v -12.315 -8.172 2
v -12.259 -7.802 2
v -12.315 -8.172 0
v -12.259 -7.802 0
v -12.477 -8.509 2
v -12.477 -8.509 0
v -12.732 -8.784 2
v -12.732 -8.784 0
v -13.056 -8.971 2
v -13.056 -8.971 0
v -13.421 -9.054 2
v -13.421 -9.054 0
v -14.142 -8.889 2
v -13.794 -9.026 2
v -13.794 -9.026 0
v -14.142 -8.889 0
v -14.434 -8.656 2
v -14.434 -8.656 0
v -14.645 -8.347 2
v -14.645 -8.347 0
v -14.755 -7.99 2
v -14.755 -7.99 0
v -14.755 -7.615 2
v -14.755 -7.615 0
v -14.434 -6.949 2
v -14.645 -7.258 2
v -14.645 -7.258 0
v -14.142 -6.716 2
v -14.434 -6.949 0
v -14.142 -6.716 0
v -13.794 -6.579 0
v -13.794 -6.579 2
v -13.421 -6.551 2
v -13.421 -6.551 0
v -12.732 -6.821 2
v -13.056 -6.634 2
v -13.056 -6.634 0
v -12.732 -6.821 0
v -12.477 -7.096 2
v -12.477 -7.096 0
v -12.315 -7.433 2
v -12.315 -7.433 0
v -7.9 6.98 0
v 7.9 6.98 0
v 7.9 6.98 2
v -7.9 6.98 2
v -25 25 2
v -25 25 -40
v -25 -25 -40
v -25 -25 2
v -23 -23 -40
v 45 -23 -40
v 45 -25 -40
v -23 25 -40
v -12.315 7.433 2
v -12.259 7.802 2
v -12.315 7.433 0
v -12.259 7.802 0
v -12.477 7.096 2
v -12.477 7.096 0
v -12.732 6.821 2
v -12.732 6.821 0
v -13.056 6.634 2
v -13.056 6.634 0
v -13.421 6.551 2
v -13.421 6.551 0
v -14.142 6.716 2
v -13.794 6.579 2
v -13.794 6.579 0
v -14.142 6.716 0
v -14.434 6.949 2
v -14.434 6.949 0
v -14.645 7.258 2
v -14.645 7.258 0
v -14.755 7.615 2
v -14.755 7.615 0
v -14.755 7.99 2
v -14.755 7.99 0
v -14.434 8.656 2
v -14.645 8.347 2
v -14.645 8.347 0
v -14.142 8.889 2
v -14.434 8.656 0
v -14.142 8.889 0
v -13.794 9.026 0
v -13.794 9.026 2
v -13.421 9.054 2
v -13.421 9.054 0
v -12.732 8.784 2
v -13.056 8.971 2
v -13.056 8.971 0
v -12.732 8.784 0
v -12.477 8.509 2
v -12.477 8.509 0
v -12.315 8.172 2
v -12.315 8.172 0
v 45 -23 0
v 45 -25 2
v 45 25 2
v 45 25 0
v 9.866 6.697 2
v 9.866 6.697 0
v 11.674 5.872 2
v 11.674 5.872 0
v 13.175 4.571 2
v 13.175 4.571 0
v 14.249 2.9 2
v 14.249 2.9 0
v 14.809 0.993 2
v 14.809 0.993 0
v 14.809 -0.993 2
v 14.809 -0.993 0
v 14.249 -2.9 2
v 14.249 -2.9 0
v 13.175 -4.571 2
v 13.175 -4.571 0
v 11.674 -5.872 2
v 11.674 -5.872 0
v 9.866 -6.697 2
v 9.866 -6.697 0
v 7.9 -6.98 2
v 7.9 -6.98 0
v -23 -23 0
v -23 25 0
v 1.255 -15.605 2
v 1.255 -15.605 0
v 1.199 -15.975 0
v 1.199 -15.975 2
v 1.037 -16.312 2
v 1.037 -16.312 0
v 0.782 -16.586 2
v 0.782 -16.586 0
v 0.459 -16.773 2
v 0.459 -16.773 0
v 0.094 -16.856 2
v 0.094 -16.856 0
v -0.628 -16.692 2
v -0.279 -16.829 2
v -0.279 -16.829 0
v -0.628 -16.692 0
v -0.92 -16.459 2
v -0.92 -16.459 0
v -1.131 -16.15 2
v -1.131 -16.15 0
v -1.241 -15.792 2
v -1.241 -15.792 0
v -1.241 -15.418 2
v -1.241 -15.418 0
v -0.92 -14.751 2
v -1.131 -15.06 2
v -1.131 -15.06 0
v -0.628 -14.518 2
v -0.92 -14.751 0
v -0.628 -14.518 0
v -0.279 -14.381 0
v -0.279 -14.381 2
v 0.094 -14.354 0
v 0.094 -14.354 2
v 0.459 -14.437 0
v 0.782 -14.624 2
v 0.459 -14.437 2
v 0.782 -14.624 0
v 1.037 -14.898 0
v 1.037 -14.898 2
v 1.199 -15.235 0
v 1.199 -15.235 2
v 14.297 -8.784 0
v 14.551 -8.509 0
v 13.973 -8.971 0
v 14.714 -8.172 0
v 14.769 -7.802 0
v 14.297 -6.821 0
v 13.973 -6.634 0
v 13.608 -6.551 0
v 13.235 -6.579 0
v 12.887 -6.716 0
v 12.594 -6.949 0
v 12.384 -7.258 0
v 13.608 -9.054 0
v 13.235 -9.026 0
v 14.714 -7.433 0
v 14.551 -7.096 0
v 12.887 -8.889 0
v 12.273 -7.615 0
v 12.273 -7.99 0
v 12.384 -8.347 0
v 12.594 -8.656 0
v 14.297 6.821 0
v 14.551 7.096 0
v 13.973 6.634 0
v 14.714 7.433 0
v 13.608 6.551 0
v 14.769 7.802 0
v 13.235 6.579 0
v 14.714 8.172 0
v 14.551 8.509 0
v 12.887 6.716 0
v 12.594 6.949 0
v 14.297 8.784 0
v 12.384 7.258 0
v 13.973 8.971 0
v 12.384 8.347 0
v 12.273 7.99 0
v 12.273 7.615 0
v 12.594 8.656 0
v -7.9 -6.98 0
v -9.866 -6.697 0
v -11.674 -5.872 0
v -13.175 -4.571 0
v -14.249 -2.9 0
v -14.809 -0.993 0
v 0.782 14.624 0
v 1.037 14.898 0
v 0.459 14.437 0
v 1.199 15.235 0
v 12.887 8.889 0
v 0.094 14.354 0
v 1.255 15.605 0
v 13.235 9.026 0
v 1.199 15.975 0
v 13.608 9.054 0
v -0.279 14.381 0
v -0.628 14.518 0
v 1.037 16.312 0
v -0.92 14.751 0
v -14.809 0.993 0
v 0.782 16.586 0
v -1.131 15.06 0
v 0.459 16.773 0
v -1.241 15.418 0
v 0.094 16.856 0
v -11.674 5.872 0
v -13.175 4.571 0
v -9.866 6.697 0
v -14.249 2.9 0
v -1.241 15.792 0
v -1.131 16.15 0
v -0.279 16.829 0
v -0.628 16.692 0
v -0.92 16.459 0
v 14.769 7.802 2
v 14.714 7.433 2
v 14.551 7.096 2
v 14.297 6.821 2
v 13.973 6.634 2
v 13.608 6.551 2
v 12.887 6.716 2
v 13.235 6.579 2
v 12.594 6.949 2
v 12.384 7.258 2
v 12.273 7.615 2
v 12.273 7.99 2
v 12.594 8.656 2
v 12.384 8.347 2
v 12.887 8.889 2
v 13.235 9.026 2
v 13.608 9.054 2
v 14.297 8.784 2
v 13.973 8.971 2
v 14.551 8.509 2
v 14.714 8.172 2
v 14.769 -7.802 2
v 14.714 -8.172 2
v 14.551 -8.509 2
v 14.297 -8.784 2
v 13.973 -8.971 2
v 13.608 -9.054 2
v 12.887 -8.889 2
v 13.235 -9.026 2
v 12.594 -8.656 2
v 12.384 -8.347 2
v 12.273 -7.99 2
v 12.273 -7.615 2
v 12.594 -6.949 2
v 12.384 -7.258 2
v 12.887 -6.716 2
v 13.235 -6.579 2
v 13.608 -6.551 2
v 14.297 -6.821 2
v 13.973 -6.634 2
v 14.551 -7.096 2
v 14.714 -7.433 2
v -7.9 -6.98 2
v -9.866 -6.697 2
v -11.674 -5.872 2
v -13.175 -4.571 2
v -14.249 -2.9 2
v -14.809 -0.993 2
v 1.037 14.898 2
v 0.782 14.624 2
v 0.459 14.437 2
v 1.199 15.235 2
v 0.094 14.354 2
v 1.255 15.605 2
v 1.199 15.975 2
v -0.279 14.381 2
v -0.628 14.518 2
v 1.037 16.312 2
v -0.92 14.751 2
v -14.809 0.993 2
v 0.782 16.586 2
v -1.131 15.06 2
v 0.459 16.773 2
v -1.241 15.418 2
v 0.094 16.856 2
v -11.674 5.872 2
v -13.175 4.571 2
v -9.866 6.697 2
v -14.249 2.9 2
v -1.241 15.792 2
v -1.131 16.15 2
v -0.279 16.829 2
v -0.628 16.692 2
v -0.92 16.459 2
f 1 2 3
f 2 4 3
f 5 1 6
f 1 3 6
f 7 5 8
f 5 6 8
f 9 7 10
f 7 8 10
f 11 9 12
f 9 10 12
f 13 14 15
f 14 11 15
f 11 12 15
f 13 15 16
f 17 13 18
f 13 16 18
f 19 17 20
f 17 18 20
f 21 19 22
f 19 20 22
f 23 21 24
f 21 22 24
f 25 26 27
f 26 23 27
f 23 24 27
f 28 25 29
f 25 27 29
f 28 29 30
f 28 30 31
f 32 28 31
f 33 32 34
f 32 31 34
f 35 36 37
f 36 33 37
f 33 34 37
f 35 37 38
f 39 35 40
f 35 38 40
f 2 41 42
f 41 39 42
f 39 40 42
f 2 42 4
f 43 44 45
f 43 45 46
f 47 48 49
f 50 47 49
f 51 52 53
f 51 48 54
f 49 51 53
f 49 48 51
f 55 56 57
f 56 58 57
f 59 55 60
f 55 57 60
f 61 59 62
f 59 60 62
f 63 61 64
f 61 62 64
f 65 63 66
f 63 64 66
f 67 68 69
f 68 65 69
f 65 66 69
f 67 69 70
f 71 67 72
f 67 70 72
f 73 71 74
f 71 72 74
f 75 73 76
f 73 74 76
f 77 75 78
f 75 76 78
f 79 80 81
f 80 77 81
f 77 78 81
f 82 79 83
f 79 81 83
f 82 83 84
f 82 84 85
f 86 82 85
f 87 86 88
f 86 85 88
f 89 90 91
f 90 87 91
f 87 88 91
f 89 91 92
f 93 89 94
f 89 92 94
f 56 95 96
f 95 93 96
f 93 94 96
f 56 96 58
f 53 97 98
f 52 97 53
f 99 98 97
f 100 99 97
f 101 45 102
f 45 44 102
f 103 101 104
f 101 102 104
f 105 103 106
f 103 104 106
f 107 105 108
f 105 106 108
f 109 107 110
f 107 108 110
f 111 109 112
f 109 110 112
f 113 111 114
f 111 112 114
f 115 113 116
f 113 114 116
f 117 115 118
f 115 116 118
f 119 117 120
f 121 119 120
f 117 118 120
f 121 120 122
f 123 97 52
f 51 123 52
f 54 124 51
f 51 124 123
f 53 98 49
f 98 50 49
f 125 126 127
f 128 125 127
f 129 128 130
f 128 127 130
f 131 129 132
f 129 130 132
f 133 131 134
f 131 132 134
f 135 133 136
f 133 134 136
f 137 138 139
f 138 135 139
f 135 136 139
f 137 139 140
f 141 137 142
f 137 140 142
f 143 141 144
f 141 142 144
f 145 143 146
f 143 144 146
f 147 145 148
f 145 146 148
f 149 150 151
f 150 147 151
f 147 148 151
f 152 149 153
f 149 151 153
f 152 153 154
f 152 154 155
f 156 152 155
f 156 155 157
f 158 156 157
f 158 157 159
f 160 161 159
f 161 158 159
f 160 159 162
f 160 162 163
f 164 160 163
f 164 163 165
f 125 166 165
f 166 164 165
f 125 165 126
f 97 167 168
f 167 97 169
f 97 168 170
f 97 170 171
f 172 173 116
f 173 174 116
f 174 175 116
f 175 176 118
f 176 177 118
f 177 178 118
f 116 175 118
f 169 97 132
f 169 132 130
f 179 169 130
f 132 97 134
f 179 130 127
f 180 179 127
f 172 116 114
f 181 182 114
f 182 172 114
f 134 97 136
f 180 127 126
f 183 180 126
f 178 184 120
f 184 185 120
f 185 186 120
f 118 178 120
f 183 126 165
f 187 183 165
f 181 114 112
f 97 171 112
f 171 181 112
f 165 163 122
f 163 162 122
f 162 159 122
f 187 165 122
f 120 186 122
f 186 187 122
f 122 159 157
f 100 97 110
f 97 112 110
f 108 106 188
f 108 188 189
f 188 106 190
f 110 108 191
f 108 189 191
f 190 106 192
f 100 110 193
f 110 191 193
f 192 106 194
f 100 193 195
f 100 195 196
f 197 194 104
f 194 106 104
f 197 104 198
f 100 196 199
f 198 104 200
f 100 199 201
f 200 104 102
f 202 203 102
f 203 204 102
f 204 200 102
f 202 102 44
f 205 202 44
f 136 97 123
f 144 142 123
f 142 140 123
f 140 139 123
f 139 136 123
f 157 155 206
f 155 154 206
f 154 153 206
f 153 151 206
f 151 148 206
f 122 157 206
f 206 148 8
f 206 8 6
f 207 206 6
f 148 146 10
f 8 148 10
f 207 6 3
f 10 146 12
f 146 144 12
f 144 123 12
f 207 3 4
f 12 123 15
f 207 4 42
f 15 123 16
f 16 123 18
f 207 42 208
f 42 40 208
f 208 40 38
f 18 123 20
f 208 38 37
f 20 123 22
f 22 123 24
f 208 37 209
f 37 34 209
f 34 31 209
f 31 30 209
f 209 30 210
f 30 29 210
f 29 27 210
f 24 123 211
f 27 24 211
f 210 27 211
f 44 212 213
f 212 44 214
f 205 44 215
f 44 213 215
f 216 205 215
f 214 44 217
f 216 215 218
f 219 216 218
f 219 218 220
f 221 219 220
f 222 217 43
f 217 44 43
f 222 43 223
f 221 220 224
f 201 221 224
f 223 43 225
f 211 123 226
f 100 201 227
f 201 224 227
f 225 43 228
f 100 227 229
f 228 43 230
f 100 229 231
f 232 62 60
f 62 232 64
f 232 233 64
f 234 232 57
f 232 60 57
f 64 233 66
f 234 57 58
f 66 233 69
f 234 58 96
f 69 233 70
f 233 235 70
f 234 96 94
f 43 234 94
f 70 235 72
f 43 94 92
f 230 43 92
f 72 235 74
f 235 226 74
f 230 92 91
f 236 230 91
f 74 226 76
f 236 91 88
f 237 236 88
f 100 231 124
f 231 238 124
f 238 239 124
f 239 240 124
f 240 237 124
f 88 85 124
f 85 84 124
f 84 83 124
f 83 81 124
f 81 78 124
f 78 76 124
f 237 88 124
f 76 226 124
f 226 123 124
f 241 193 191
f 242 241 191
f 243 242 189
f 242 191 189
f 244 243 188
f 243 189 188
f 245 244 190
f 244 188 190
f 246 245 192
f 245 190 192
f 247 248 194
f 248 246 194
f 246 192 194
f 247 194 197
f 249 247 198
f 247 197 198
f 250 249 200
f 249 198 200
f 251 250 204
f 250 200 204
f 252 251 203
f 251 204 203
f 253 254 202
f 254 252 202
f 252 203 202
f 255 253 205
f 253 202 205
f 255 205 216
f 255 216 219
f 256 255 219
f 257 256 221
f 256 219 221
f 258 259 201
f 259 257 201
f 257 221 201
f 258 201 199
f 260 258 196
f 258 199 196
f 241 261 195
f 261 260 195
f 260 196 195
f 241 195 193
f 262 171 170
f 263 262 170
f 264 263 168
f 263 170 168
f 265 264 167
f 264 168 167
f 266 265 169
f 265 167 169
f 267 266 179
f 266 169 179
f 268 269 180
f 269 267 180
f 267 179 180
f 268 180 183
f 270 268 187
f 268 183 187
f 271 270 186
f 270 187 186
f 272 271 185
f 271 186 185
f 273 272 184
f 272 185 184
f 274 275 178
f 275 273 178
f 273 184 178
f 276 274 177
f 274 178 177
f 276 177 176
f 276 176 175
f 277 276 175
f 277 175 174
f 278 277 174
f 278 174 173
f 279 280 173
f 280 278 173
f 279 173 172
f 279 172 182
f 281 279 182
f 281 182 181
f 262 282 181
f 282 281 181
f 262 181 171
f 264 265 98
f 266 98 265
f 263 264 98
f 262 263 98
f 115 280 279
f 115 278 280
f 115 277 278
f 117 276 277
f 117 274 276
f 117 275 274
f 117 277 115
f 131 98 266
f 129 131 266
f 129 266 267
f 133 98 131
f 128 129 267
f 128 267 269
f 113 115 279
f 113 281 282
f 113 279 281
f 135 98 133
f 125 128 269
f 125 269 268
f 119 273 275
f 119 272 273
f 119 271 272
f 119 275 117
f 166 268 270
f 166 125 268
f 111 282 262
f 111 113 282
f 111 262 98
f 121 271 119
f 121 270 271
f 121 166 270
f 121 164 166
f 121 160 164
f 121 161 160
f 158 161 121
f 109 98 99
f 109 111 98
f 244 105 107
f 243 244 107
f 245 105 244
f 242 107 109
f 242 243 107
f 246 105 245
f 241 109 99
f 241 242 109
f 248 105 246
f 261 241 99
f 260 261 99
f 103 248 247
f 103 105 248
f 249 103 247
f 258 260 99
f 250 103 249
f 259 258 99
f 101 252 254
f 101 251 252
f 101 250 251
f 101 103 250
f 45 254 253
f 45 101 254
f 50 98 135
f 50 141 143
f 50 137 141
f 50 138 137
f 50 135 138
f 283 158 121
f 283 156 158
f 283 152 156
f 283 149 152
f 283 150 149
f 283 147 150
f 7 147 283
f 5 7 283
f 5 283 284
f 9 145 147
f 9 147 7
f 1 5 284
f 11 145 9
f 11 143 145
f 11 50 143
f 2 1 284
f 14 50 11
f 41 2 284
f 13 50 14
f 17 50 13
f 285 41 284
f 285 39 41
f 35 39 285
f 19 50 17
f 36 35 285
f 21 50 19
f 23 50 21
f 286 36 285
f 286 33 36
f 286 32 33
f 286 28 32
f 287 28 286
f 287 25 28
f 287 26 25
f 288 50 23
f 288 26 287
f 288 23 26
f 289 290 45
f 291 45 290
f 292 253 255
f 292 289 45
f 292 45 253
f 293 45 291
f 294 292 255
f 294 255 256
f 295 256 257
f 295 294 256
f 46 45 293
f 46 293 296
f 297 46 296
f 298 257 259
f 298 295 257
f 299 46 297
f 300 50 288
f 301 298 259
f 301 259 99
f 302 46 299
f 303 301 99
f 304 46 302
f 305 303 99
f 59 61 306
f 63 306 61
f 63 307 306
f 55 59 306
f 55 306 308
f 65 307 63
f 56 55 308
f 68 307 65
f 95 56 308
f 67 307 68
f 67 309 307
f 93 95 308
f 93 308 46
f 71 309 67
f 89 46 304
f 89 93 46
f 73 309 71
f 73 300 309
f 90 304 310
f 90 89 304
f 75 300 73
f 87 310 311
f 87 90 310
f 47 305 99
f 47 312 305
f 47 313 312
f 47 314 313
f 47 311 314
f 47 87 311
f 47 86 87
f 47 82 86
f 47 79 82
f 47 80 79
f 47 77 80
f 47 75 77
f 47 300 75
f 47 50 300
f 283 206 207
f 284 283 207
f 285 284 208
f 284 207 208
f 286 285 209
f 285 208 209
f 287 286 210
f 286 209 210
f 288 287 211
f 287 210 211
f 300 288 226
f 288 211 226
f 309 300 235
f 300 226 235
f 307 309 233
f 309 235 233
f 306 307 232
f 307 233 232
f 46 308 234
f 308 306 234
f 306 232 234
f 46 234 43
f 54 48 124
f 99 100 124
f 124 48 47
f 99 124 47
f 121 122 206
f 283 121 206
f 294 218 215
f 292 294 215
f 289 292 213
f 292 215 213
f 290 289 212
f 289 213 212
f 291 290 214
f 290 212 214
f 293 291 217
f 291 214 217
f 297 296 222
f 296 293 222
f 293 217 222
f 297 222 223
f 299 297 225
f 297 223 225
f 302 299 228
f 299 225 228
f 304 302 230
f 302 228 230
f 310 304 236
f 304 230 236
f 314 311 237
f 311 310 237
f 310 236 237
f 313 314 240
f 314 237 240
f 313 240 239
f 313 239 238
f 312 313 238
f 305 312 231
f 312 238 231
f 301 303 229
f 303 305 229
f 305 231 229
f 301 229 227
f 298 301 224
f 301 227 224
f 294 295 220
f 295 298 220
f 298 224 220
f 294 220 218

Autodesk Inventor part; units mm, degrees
ref_plane "YZ Plane" through (0, 0, 0) normal (1, 0, 0) x (0, 1, 0)
ref_plane "XZ Plane" through (0, 0, 0) normal (0, 1, 0) x (-1, 0, 0)
ref_plane "XY Plane" through (0, 0, 0) normal (0, 0, 1) x (1, 0, 0)
sketch "Sketch1" plane through (0, 0, 0) normal (0, 0, 1) x (1, 0, 0)
  circle A0 centre (0, 0) radius 18.38
  circle A1 centre (13.5143, 7.8025) radius 1.255
  circle A2 centre (0, 15.605) radius 1.255
  circle A3 centre (-13.5143, 7.8025) radius 1.255
  circle A4 centre (-13.5143, -7.8025) radius 1.255
  circle A5 centre (0, -15.605) radius 1.255
  circle A6 centre (13.5143, -7.8025) radius 1.255
  circle A7 centre (7.9, 0) radius 5.98
  line L0 (25, 25) -> (-25, 25)
  line L1 (-25, 25) -> (-25, -25)
  line L2 (-25, -25) -> (25, -25)
  line L3 (25, -25) -> (25, 25)
  line L4 (25, 25) -> (-25, -25) construction
  line L5 (-25, 25) -> (25, -25) construction
  circle A8 centre (7.9, 0) radius 6.98
  line L6 (7.9, -6.98) -> (-7.9, -6.98)
  line L7 (7.9, 6.98) -> (-7.9, 6.98)
  circle A9 centre (-7.9, 0) radius 6.98
  line L8 (23, 23) -> (-23, 23)
  line L9 (-23, 23) -> (-23, -23)
  line L10 (-23, -23) -> (23, -23)
  line L11 (23, -23) -> (23, 23)
  line L12 (-23, 23) -> (-23, 25)
  line L13 (23, 23) -> (23, 25)
  line L14 (23, -23) -> (23, -25)
  line L15 (23, -23) -> (25, -23)
  point P0 (0, 0)
  dimension "d0" = 50
  dimension "d1" = 50
  dimension "d2" = 1
  dimension "d3" = 15.8
  dimension "d6" = 2
extrude "Extrusion1" add sketch "Sketch1" along normal blind 2 contours A0 | L3 L15 L11 L13 L0 | L13 L8 L12 L0 | L3 L2 L14 L15 | L12 L9 L10 L14 L2 L1 L0 | L11 L10 L9 L8
extrude "Extrusion2" add sketch "Sketch1" against normal blind 40 contours L3 L2 L14 L15 | L12 L9 L10 L14 L2 L1 L0
thread "Thread1" size "M2.5x0.45" class "6H" standard "ISO Metric profile" length 10
thread "Thread2" size "M2.5x0.45" class "6H" standard "ANSI Metric M Profile" length 10
thread "Thread3" size "M2.5x0.45" class "6H" standard "ISO Metric profile" full length
thread "Thread4" size "M2.5x0.45" class "6H" standard "ANSI Metric M Profile" full length
thread "Thread5" size "M2.5x0.45" class "6H" standard "ANSI Metric M Profile" full length
thread "Thread6" size "M2.5x0.45" class "6H" standard "ANSI Metric M Profile" full length
sketch "Sketch2" plane through (25, -25, 0) normal (1, 0, 0) x (0, 0, -1)
  line L0 (0, 2) -> (0, 50) projected
  line L1 (0, 2) -> (40, 2) projected
  line L2 (40, 2) -> (40, 0) projected
  line L3 (0, 0) -> (40, 0) projected
  line L4 (40, 0) -> (-2, 0) projected
  line L5 (-2, 0) -> (-2, 50) projected
  line L6 (0, 50) -> (-2, 50) projected
  point P0 (0, 25)
extrude "Extrusion3" add sketch "Sketch2" along normal blind 20
properties part number "extendeddrivemotorcasing"
